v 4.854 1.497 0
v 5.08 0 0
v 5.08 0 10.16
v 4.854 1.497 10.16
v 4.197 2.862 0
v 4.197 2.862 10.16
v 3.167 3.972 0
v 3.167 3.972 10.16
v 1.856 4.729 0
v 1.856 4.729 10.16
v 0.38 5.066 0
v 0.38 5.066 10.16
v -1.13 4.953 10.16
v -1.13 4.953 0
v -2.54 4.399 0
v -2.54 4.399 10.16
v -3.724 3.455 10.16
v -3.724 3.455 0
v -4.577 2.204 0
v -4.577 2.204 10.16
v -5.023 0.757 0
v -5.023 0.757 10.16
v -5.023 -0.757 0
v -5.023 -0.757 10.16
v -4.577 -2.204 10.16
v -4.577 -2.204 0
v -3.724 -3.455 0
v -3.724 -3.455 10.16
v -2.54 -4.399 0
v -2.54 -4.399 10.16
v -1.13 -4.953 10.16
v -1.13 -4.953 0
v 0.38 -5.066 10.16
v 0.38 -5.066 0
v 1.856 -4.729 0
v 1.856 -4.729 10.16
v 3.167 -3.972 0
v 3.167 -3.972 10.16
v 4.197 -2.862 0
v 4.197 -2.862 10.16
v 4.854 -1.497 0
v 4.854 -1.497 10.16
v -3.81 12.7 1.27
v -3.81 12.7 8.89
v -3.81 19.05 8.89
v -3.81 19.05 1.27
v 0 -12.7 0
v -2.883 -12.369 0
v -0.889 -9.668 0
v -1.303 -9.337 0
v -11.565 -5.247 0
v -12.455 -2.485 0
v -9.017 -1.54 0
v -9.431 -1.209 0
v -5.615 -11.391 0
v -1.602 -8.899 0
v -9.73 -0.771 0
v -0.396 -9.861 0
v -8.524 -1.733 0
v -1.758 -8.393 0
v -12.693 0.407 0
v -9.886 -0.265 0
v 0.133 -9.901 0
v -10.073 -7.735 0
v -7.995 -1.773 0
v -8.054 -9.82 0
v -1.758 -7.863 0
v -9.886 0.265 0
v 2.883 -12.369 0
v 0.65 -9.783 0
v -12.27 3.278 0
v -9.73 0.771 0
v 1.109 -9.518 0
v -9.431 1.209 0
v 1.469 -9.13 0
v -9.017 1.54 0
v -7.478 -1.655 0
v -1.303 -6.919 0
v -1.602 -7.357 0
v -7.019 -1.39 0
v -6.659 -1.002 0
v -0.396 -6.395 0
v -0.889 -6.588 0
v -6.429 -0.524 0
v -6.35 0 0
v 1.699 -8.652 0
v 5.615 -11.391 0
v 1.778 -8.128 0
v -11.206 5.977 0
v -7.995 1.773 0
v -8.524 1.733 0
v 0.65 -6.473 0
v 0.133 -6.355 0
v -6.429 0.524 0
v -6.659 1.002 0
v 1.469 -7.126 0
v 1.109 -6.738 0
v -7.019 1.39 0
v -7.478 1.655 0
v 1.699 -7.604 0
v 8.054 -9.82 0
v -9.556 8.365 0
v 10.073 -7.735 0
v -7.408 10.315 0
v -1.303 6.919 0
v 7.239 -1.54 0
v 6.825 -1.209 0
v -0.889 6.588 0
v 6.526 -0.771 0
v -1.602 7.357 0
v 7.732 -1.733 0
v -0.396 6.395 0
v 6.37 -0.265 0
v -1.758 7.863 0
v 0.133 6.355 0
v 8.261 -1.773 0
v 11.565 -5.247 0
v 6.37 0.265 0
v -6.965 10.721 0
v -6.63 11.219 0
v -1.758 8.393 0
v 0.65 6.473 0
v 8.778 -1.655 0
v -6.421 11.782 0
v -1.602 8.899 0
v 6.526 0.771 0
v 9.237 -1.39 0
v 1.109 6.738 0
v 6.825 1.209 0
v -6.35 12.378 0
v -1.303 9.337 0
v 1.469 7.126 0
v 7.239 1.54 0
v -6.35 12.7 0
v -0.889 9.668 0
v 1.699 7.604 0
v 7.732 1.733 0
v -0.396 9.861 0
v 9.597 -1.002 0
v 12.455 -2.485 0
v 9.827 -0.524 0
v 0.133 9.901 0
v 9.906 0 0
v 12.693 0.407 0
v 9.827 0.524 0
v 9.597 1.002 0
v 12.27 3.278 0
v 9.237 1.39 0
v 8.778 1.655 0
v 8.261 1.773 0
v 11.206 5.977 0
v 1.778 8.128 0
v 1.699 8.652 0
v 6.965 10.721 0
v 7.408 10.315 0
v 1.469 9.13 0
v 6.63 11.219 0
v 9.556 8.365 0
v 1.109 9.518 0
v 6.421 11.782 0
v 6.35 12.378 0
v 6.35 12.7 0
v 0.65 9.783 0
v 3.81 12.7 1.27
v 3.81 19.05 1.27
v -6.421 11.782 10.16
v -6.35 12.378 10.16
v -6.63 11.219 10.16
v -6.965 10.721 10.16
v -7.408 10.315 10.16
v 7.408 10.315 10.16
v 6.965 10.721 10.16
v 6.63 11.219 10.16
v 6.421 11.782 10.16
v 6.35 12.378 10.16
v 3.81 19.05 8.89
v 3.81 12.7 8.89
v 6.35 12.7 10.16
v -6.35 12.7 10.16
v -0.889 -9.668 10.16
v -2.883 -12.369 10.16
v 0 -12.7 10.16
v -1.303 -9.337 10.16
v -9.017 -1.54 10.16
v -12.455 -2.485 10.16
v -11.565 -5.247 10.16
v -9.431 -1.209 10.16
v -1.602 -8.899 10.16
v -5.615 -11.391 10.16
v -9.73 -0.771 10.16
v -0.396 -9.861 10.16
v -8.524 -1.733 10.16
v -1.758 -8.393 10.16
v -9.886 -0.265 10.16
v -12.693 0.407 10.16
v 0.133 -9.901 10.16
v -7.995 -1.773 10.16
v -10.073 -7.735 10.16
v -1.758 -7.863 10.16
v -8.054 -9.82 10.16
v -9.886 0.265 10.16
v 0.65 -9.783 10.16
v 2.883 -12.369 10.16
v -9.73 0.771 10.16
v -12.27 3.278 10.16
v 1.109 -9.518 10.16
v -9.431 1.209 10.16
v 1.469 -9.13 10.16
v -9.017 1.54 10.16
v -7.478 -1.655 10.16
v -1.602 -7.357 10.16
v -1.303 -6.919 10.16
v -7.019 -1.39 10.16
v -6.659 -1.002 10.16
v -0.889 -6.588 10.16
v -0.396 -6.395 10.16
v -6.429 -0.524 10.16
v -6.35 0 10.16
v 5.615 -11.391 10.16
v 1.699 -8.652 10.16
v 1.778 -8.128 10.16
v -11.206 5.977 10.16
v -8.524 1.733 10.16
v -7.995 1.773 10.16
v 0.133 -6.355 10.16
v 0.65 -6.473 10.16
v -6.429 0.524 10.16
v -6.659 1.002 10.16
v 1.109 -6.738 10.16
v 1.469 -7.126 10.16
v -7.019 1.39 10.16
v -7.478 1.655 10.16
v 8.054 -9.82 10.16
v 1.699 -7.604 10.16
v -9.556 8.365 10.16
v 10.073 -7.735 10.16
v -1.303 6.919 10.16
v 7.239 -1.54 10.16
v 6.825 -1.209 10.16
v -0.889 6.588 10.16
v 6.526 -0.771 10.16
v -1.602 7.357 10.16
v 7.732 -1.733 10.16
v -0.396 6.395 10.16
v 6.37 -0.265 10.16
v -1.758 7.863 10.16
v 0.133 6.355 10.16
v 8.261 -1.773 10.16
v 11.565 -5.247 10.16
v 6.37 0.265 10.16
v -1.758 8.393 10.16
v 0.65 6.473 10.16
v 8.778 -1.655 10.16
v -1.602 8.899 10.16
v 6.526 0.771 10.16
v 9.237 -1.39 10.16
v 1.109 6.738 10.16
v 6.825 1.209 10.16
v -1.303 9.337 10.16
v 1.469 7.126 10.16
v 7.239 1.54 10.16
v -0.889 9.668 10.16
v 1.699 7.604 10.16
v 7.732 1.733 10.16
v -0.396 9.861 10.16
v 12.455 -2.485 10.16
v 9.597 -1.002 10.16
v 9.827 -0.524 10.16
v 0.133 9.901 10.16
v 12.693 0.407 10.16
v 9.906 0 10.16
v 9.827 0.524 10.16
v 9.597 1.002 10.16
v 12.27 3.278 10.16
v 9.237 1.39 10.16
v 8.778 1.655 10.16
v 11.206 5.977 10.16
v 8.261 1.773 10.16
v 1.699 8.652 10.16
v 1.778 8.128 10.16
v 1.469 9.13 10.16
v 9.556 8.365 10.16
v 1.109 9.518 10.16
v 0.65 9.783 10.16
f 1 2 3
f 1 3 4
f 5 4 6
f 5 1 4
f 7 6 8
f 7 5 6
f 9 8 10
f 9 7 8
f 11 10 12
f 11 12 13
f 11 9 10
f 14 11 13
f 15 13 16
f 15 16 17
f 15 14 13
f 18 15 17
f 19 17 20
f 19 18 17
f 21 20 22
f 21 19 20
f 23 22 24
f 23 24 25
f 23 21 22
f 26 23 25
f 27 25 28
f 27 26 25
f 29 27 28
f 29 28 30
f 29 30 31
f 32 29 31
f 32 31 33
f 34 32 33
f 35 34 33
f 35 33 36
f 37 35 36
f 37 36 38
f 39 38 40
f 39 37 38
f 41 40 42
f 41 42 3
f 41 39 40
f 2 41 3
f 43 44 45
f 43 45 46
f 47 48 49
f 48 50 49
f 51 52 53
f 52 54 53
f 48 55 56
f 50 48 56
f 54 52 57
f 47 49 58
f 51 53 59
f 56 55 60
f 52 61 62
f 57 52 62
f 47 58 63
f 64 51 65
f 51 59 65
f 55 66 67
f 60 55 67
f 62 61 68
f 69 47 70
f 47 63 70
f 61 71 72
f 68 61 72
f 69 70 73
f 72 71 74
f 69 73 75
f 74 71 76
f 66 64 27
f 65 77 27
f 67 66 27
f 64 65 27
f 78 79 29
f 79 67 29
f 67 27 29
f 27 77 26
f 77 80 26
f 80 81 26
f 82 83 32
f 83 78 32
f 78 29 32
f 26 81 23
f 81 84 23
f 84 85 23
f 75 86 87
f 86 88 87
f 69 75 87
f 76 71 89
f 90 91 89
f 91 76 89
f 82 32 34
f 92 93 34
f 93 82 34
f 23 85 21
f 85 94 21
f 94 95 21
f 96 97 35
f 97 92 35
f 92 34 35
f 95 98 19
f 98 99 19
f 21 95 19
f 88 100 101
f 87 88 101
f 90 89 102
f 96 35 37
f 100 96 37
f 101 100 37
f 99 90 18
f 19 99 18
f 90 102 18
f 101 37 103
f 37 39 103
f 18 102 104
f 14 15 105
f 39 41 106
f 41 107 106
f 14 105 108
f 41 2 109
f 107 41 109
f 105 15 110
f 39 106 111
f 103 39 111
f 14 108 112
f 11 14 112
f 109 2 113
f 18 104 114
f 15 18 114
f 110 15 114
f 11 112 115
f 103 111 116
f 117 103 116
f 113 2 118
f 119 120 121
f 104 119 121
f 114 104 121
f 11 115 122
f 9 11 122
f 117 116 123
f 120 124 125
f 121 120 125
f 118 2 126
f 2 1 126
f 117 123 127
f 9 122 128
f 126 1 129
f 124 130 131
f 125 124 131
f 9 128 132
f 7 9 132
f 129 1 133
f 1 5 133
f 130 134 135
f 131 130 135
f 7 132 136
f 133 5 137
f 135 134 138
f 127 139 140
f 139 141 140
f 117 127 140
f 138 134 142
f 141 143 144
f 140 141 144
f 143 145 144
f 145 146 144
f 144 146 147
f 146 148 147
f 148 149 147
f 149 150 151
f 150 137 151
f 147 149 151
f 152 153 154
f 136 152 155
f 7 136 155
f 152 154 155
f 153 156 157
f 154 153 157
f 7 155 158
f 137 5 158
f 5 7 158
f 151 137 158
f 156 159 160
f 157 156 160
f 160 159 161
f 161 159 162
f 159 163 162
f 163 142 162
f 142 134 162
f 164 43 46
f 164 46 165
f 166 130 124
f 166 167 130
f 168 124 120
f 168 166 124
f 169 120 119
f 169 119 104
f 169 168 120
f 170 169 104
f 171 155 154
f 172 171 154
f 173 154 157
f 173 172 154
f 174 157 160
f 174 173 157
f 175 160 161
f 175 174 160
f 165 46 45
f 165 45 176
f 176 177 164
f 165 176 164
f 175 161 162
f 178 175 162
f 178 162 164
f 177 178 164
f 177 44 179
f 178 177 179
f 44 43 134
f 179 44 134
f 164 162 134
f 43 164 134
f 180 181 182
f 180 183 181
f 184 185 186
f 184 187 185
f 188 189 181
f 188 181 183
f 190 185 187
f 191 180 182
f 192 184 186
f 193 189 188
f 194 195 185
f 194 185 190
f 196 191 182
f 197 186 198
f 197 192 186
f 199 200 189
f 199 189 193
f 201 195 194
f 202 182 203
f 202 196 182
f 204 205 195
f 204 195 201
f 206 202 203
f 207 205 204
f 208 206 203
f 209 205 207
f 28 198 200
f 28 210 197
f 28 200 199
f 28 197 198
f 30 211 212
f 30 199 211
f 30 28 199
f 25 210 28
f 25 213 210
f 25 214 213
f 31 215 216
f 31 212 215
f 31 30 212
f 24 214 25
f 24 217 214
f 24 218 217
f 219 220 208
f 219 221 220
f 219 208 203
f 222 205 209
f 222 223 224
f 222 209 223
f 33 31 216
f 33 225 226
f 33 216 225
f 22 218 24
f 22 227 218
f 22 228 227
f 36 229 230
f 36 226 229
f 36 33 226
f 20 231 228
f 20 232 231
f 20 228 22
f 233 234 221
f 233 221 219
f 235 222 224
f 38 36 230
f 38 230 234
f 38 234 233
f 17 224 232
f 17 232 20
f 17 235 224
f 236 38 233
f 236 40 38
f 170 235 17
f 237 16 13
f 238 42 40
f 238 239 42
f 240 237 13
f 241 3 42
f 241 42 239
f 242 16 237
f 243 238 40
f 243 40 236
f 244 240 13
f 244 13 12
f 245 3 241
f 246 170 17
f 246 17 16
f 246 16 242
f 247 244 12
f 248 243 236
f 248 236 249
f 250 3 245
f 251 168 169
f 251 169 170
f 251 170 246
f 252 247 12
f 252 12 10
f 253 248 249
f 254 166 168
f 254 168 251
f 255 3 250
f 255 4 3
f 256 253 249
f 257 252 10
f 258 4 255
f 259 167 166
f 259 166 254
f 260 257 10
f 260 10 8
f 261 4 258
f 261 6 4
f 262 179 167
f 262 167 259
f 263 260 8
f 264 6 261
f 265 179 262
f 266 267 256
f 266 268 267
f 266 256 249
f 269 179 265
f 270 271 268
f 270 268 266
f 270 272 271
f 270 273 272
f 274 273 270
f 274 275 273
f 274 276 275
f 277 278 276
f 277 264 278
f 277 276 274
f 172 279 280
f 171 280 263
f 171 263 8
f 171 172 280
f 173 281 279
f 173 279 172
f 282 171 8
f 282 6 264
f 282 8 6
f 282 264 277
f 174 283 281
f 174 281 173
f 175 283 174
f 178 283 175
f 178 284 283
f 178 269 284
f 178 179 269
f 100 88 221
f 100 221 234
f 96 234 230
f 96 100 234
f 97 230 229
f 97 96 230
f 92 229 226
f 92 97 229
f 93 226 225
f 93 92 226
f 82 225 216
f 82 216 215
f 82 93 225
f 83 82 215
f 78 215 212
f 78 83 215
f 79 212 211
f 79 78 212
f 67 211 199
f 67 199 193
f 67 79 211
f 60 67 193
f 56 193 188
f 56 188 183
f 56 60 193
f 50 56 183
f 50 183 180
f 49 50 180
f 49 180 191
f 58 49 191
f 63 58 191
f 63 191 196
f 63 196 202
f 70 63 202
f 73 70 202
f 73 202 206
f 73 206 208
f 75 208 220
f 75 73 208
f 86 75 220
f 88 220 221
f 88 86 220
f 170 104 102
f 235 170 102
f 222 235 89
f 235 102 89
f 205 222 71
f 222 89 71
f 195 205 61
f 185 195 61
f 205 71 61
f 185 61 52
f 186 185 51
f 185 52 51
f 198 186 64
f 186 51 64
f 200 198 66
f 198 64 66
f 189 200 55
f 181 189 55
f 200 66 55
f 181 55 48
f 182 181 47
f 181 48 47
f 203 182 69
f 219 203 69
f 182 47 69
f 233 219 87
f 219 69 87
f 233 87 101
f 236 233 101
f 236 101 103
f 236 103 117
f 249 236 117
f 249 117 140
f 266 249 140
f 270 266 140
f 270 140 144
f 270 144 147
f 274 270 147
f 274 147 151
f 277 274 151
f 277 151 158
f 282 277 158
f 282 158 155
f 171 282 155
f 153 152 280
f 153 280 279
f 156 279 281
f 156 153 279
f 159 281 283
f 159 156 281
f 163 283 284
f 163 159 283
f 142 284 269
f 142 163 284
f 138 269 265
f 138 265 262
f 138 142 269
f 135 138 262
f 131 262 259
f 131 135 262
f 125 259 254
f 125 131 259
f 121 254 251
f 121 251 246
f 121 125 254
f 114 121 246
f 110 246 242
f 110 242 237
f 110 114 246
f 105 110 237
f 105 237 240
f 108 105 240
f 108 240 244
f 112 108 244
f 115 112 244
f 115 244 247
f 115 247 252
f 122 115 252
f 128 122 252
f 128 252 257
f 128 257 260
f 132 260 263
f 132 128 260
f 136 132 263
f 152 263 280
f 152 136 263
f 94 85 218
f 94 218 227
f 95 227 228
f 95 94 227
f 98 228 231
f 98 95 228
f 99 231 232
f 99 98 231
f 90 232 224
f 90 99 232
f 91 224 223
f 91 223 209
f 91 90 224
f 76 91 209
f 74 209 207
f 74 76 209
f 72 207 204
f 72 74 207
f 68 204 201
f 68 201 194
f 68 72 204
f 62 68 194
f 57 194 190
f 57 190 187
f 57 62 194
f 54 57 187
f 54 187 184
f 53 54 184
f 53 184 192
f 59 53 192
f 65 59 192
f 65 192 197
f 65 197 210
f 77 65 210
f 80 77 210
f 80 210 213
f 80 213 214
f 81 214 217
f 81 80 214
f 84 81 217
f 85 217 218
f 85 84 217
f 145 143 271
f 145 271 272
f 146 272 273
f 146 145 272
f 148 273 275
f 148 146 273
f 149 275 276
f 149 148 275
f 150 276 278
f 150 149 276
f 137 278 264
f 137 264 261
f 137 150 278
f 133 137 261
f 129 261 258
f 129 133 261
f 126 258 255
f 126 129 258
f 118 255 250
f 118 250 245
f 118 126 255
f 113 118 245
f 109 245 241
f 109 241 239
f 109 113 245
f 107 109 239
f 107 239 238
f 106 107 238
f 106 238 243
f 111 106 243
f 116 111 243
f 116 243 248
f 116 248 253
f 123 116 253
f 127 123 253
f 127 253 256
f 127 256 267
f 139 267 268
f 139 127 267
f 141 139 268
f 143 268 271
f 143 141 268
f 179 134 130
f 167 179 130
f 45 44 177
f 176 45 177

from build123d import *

# Parameters (mm, degrees)
SKETCH1_R           = 5.08
SKETCH1_R_2         = 1.778
BOSS_EXTRUDE1_DEPTH = 10.16
FILLET1_R           = 2.54
SKETCH2_W           = 7.62
SKETCH2_H           = 7.62
BOSS_EXTRUDE3_DEPTH = 6.35


with BuildPart() as part:
    # Sketch1 → Boss-Extrude1 (new body)
    with BuildSketch(Plane.XY):
        with BuildLine():
            Line((-6.35, 12.7), (-6.35, 10.998522628))
            ThreePointArc((-6.35, 10.998522628), (0, -12.7), (6.35, 10.998522628))
            Line((6.35, 10.998522628), (6.35, 12.7))
            Line((6.35, 12.7), (-6.35, 12.7))
        make_face()
        Circle(SKETCH1_R, mode=Mode.SUBTRACT)
        with Locations((0, 8.128)):
            Circle(SKETCH1_R_2, mode=Mode.SUBTRACT)
        with Locations((8.128, 0)):
            Circle(SKETCH1_R_2, mode=Mode.SUBTRACT)
        with Locations((0, -8.128)):
            Circle(SKETCH1_R_2, mode=Mode.SUBTRACT)
        with Locations((-8.128, 0)):
            Circle(SKETCH1_R_2, mode=Mode.SUBTRACT)
    extrude(amount=BOSS_EXTRUDE1_DEPTH)

    # Fillet1
    fillet1_edges = [part.edges().sort_by_distance(p)[0] for p in [
        (-6.35, 10.998522628, 5.08),
        (6.35, 10.998522628, 5.08),
    ]]
    fillet(fillet1_edges, radius=FILLET1_R)

    # Sketch2 → Boss-Extrude3 (add)
    with BuildSketch(Plane(origin=(0, 12.7, 0), x_dir=(1, 0, 0), z_dir=(0, 1, 0))):
        with Locations((0, -5.08)):
            Rectangle(SKETCH2_W, SKETCH2_H)
    extrude(amount=BOSS_EXTRUDE3_DEPTH)


solid = part.part
